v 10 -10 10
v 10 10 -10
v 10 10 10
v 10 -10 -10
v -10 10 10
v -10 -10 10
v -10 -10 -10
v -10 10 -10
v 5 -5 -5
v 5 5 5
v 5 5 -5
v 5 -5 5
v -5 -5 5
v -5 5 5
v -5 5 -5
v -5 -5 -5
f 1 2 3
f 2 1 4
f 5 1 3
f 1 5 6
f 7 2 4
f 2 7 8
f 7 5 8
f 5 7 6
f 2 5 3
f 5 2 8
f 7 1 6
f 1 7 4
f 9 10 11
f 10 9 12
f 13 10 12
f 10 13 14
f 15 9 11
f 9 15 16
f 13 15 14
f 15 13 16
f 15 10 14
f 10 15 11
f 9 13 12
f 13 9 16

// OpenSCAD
difference() {
    cube([20,20,20], center=true);
    cube([10,10,10], center=true);
}
